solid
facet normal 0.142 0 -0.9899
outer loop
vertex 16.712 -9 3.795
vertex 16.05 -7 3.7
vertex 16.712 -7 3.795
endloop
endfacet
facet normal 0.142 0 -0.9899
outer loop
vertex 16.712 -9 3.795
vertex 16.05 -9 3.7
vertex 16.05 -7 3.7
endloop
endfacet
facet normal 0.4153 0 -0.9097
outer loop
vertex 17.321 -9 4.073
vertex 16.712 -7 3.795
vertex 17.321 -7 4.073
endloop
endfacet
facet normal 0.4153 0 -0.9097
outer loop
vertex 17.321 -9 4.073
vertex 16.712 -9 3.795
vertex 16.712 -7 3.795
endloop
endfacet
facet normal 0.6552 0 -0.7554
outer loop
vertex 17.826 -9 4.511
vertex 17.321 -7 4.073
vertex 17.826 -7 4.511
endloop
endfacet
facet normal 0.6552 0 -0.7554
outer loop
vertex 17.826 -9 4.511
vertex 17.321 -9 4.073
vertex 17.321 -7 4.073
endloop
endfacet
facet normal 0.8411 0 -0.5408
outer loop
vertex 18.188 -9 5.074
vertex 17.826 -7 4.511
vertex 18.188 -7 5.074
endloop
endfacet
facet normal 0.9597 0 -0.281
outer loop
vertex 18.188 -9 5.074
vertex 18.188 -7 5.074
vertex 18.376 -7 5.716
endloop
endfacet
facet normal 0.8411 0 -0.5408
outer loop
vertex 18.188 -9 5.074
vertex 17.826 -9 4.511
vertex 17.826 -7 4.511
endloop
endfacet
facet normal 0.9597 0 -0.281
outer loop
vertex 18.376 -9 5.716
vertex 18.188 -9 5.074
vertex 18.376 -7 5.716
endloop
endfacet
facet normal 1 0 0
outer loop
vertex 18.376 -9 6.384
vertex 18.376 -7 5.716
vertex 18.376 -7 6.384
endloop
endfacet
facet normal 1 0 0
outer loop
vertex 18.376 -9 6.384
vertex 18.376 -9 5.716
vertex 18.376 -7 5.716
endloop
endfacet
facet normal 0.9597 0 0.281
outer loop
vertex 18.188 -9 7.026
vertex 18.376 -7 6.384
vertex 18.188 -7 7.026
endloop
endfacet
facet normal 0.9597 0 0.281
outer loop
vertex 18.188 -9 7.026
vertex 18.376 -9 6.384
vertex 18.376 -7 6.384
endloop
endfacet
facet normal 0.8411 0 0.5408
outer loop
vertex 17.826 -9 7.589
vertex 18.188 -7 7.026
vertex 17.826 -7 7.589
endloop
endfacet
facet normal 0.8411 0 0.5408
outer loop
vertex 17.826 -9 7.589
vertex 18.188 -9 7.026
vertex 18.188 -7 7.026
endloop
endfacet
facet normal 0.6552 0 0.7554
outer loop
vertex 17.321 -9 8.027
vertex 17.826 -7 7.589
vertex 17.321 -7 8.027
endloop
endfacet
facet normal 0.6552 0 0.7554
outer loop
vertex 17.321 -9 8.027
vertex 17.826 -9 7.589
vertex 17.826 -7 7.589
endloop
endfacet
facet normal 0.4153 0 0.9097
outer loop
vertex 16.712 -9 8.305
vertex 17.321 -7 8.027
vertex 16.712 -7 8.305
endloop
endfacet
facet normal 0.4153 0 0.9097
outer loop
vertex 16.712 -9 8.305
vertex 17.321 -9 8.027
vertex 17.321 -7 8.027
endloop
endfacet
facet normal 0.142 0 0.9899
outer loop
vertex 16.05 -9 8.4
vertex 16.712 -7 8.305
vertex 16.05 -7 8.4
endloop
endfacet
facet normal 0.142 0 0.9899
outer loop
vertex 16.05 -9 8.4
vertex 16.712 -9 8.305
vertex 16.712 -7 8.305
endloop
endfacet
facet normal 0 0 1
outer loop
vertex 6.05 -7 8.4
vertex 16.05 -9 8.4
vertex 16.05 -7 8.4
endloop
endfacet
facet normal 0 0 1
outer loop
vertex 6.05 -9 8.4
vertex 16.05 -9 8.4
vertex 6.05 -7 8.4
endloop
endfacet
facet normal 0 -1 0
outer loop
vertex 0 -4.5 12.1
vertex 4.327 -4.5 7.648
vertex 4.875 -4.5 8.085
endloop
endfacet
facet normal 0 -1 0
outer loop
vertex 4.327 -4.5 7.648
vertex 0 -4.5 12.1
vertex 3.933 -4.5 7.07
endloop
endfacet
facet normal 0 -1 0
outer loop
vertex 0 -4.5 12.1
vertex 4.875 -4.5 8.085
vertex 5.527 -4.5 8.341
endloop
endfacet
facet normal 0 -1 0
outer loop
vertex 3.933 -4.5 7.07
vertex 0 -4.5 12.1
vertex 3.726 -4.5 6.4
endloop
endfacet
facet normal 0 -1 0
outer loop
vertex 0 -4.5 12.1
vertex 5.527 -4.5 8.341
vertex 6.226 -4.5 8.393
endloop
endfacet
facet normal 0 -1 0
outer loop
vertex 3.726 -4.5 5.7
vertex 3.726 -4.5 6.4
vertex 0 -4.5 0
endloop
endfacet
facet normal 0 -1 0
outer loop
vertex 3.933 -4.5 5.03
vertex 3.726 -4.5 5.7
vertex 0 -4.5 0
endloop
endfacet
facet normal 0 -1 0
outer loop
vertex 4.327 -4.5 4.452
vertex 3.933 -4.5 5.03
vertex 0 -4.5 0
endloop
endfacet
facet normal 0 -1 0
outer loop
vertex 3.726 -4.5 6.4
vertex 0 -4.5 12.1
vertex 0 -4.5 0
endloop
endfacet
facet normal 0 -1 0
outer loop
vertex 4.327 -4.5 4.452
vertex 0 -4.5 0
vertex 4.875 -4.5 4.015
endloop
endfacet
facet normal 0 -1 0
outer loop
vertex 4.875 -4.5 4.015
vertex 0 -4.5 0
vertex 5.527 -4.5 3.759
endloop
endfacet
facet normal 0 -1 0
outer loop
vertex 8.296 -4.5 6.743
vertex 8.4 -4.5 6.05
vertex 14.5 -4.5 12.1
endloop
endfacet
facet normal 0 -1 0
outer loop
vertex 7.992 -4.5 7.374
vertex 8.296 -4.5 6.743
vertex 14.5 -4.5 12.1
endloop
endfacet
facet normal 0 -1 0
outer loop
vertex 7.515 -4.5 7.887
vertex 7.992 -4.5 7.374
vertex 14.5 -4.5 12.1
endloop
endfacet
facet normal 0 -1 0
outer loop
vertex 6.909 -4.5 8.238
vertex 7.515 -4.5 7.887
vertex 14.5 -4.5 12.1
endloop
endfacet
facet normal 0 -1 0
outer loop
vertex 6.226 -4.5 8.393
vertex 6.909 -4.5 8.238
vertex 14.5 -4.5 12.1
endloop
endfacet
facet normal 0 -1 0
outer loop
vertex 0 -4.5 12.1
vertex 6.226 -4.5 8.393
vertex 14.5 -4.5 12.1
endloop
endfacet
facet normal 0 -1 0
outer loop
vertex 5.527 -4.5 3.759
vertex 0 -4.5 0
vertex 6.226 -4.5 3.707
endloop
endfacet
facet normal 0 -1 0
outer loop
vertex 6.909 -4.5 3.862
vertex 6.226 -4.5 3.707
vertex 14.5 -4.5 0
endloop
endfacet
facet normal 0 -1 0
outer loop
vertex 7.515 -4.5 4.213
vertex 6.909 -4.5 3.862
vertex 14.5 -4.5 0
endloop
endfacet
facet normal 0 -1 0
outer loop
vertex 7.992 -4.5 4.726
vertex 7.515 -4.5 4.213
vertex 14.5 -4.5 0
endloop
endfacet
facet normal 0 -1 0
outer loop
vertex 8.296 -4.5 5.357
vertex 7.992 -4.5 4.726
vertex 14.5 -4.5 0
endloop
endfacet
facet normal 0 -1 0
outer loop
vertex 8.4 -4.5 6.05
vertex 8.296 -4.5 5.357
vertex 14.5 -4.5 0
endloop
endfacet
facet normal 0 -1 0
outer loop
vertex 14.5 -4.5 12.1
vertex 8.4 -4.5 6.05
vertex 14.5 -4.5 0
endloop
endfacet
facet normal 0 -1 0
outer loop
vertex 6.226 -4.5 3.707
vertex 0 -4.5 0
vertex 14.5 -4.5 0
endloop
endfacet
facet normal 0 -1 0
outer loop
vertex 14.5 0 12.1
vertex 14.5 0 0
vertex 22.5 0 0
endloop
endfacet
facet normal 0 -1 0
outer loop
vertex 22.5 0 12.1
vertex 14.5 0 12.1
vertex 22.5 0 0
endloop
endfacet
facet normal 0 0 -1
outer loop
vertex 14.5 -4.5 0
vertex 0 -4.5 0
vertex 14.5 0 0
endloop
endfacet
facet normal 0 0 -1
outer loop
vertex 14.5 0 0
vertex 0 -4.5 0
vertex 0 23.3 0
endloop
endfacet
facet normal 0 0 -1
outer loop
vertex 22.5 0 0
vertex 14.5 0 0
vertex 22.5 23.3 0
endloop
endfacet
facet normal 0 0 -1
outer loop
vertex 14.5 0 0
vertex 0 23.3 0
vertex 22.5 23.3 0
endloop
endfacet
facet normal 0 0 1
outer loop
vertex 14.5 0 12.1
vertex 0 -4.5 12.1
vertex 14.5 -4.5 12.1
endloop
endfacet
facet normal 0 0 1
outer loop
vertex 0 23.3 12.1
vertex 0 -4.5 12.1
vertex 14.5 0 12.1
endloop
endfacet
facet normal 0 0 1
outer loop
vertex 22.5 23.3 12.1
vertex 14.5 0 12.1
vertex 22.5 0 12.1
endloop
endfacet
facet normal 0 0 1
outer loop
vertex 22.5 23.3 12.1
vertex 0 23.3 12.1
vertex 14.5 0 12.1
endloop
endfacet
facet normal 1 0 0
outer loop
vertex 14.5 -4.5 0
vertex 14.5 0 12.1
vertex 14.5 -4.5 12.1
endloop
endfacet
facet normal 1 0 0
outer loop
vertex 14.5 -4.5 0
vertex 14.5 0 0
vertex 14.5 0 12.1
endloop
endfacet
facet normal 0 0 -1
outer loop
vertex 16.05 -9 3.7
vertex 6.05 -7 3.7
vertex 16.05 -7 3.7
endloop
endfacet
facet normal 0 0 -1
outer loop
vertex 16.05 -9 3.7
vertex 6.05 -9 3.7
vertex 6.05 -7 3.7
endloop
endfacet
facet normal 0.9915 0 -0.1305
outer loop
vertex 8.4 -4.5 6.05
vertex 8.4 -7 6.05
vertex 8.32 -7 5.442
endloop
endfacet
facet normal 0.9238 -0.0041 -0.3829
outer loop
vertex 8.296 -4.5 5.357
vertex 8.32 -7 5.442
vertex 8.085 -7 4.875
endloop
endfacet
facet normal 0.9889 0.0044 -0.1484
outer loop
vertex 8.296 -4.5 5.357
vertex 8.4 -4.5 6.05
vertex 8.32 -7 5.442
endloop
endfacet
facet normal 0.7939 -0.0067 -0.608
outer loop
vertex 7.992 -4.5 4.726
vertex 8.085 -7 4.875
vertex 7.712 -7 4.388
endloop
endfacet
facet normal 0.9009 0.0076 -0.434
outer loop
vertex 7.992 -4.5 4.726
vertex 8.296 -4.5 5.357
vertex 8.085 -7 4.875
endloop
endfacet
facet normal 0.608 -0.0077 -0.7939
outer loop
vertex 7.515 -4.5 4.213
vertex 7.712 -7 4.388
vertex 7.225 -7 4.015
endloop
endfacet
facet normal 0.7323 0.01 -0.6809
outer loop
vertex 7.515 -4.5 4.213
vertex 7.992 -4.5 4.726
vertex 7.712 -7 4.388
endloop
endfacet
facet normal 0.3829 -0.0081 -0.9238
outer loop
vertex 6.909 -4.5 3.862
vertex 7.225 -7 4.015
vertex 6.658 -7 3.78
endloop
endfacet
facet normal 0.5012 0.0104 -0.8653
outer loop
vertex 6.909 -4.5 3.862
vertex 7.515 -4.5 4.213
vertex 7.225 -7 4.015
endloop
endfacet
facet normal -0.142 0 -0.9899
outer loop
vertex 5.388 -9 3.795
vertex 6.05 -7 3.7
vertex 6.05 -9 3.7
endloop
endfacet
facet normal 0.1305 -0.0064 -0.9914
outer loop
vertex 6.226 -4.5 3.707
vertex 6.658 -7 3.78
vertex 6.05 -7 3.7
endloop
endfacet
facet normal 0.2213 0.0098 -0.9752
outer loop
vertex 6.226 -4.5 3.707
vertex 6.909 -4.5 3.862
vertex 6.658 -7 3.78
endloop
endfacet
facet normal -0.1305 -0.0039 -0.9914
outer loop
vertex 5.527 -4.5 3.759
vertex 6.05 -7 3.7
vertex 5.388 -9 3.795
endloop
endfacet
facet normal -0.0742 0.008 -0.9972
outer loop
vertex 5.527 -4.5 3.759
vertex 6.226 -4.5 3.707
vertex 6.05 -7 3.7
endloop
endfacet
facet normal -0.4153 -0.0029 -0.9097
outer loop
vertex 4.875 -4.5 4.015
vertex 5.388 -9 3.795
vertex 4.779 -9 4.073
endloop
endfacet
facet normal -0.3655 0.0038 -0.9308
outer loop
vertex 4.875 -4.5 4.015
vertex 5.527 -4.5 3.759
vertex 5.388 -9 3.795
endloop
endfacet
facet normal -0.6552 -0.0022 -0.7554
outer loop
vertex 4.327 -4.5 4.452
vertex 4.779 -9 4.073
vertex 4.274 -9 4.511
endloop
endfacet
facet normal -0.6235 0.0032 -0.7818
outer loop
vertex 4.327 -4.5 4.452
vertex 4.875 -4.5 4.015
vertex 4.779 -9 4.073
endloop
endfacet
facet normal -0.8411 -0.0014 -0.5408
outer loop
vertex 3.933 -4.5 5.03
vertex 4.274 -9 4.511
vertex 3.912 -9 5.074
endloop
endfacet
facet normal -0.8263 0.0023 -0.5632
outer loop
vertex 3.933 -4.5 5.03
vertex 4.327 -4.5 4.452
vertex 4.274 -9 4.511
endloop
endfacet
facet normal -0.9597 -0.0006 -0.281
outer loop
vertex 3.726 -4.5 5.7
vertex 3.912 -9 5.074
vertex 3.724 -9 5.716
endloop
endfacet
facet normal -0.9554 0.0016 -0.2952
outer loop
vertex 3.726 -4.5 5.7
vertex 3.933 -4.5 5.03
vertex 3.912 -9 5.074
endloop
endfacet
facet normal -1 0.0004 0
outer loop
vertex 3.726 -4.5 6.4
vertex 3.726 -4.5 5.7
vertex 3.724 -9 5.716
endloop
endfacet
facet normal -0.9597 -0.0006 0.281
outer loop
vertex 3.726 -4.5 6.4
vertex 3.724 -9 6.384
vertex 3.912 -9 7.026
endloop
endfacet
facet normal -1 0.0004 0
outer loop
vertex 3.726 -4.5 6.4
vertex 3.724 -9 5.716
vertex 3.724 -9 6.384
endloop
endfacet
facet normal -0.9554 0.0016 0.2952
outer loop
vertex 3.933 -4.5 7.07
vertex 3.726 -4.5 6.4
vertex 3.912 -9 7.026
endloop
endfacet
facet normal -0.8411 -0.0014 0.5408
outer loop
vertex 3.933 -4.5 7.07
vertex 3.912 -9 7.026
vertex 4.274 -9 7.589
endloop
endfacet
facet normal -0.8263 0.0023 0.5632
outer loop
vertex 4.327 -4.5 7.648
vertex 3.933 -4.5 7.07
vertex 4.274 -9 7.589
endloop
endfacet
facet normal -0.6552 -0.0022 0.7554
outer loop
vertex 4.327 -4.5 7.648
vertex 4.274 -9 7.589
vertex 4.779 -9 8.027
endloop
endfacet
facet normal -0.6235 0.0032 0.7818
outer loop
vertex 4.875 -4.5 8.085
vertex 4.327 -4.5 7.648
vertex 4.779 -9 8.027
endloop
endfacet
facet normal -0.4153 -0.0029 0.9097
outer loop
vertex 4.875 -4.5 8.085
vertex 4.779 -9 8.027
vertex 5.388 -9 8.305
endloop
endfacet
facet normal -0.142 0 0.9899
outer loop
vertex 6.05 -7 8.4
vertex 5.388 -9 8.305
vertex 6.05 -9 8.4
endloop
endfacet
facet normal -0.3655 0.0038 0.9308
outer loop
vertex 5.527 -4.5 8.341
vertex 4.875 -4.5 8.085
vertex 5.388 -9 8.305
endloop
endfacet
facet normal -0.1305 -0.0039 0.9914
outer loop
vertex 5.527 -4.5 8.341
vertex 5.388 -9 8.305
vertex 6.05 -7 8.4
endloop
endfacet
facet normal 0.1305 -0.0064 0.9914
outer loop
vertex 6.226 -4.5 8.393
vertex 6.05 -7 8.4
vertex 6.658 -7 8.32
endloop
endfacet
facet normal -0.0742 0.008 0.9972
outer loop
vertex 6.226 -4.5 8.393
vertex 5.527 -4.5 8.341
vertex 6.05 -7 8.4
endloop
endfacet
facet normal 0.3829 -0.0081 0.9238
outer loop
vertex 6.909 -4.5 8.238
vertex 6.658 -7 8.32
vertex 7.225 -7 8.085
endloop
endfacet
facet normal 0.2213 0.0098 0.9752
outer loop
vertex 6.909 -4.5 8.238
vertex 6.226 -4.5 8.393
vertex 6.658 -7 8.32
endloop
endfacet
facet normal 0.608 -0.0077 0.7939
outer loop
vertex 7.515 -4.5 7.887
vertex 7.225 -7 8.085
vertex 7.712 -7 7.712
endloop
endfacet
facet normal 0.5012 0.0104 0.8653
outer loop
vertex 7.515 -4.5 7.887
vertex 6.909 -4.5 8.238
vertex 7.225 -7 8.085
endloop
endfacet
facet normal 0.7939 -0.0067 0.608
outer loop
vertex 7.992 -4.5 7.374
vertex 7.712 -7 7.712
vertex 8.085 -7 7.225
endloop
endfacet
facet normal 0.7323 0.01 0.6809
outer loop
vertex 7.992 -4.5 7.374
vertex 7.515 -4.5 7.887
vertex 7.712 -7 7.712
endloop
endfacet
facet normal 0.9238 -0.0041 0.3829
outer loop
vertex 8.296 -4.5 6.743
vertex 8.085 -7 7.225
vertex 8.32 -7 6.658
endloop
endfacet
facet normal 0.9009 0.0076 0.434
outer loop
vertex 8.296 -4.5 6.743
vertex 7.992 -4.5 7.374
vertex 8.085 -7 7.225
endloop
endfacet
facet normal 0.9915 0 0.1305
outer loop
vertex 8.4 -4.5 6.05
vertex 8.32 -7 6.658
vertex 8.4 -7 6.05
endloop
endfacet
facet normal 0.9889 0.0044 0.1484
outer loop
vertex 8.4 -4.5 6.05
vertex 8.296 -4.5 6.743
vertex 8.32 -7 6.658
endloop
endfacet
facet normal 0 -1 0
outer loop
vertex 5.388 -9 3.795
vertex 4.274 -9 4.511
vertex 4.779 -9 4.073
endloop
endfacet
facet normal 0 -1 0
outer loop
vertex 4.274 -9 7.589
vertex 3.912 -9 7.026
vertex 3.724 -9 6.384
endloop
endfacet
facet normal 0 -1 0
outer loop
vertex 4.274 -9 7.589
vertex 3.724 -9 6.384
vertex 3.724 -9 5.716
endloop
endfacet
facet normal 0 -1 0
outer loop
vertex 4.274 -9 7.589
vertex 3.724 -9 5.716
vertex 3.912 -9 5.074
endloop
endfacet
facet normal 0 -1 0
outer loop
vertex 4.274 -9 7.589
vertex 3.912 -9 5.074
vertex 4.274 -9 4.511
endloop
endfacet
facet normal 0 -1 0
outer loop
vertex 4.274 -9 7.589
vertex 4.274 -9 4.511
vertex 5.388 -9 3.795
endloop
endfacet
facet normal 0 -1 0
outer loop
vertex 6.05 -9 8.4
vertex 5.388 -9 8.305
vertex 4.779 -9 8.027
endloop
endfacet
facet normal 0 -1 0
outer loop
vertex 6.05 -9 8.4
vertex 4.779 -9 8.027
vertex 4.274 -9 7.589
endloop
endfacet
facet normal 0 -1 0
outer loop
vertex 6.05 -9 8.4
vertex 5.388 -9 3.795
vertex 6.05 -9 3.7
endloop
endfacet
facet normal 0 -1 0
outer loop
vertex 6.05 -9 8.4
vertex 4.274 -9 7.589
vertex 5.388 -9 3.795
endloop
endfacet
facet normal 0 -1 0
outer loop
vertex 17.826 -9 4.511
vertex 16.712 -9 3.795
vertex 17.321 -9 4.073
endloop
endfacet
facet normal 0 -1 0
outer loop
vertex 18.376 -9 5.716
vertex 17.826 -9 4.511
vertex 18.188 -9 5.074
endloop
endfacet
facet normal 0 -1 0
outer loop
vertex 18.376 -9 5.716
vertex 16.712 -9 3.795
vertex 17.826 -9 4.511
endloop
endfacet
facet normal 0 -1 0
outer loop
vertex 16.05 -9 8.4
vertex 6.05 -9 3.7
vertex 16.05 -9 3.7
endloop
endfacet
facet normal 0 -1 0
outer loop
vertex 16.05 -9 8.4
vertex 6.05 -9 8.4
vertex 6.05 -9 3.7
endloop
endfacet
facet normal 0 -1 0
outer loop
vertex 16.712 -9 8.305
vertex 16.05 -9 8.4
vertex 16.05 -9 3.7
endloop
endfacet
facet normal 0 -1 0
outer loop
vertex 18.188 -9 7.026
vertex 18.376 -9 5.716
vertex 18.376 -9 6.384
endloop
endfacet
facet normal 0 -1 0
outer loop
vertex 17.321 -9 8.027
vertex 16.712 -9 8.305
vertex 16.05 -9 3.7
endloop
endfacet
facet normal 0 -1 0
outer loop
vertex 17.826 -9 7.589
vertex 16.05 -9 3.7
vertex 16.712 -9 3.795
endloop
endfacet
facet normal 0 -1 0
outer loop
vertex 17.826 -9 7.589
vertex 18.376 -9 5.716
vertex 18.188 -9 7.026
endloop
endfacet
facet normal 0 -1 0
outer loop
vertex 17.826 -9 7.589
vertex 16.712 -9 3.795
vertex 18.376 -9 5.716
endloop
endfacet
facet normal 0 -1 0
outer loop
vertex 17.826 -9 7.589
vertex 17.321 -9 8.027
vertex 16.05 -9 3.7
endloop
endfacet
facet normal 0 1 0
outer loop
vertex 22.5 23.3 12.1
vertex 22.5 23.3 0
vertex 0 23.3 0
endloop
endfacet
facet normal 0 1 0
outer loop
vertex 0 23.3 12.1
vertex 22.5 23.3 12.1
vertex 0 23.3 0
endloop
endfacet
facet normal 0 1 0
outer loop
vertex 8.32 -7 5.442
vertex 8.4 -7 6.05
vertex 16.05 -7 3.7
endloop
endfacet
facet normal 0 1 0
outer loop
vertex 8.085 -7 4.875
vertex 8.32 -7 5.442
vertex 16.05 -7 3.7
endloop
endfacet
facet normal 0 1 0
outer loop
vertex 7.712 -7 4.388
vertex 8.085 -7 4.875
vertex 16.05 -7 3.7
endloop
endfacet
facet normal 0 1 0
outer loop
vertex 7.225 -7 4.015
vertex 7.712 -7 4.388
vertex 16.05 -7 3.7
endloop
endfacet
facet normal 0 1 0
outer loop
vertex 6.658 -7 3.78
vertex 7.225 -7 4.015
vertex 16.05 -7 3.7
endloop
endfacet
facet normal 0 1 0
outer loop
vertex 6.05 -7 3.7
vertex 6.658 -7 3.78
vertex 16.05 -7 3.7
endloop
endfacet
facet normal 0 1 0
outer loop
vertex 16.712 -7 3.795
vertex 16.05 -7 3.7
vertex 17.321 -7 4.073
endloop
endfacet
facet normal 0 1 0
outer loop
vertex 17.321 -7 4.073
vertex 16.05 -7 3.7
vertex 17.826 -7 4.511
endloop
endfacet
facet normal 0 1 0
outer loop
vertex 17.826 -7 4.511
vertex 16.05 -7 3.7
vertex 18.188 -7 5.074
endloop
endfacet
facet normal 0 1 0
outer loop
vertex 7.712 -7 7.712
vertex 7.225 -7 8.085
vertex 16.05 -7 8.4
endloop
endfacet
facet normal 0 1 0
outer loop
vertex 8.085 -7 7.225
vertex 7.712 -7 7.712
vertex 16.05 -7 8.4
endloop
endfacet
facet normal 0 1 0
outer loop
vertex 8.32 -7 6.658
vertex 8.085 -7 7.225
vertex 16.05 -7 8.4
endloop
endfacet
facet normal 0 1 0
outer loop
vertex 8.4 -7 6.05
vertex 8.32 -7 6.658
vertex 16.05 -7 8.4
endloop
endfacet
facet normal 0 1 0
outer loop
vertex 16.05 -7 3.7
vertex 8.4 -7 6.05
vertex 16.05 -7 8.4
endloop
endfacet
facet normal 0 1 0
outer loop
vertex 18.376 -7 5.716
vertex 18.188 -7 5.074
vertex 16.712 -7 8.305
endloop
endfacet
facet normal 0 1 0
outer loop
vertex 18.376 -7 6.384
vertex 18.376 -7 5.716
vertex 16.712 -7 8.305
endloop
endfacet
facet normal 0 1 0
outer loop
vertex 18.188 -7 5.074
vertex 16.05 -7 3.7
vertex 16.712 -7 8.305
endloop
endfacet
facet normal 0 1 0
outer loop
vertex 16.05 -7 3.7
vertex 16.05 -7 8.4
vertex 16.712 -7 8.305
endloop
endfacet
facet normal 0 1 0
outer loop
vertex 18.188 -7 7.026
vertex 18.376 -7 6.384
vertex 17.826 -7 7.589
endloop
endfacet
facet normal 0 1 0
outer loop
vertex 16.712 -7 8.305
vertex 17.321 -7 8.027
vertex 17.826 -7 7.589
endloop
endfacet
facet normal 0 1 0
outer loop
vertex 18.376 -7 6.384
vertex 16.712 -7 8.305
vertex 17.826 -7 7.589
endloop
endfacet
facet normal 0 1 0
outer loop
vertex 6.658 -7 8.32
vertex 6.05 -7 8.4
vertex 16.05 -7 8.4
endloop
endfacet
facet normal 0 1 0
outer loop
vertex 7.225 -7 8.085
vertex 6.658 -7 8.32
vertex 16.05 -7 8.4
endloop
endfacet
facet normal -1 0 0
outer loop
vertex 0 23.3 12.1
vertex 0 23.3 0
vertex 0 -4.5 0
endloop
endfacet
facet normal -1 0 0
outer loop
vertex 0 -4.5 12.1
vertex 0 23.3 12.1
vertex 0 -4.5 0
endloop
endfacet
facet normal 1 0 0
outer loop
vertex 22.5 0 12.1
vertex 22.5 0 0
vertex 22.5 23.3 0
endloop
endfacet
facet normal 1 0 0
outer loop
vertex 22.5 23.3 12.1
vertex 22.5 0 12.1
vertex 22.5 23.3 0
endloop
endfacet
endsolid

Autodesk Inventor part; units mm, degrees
ref_plane "YZ Plane" through (0, 0, 0) normal (1, 0, 0) x (0, 1, 0)
ref_plane "XZ Plane" through (0, 0, 0) normal (0, 1, 0) x (-1, 0, 0)
ref_plane "XY Plane" through (0, 0, 0) normal (0, 0, 1) x (1, 0, 0)
sketch "Sketch1" plane through (0, 0, 0) normal (0, 0, 1) x (1, 0, 0)
  line L0 (0, 0) -> (22.5, 0)
  line L1 (22.5, 0) -> (22.5, 23.3)
  line L2 (22.5, 23.3) -> (0, 23.3)
  line L3 (0, 23.3) -> (0, 0)
  line L4 (0, 0) -> (14.5, 0)
  line L5 (14.5, 0) -> (14.5, -4.5)
  line L6 (0, -4.5) -> (0, 0)
  line L7 (0, -4.5) -> (14.5, -4.5)
  dimension "d0" = 23.3
  dimension "d1" = 22.5
  dimension "d2" = 14.5
  dimension "d3" = 4.5
extrude "Extrusion1" add sketch "Sketch1" along normal blind 12.1
sketch "Sketch2" plane through (0, -4.5, 0) normal (0, -1, 0) x (1, 0, 0)
  line L0 (0, 0) -> (14.5, 0) projected
  line L1 (14.5, 0) -> (14.5, 12.1) projected
  line L2 (0, 12.1) -> (14.5, 12.1) projected
  line L3 (0, 0) -> (0, 12.1) projected
  line L4 (0, 0) -> (0, 12.1) projected
  line L5 (0, 6.05) -> (14.5, 6.05) construction
  line L6 (0, 12.1) -> (14.5, 12.1) projected
  line L7 (0, 0) -> (14.5, 0) projected
  circle A0 centre (6.05, 6.05) radius 6.05 construction
  line L8 (6.05, 6.05) -> (6.05, 0) construction
  circle A1 centre (6.05, 6.05) radius 2.35
  dimension "d6" = 4.7
extrude "Extrusion2" add sketch "Sketch2" along normal blind 4.5 contours A1
sketch "Sketch3" plane through (6.05, -9, 6.05) normal (0, -1, 0) x (1, 0, 0)
  line L0 (0, 0) -> (10, 0) construction
  line L1 (0, -2.35) -> (10, -2.35)
  line L2 (10, 2.35) -> (0, 2.35)
  arc A0 (0, 2.35) -> (0, -2.35) centre (0, 0) ccw
  arc A1 (10, -2.35) -> (10, 2.35) centre (10, 0) ccw
  circle A2 centre (0, 0) radius 2.35 projected
  point P0 (-6.05, -6.05)
  point P1 (5, 0)
  point P2 (-2.35, 0)
  dimension "d9" = 10
extrude "Extrusion3" add sketch "Sketch3" against normal blind 2
properties part number "servo"
